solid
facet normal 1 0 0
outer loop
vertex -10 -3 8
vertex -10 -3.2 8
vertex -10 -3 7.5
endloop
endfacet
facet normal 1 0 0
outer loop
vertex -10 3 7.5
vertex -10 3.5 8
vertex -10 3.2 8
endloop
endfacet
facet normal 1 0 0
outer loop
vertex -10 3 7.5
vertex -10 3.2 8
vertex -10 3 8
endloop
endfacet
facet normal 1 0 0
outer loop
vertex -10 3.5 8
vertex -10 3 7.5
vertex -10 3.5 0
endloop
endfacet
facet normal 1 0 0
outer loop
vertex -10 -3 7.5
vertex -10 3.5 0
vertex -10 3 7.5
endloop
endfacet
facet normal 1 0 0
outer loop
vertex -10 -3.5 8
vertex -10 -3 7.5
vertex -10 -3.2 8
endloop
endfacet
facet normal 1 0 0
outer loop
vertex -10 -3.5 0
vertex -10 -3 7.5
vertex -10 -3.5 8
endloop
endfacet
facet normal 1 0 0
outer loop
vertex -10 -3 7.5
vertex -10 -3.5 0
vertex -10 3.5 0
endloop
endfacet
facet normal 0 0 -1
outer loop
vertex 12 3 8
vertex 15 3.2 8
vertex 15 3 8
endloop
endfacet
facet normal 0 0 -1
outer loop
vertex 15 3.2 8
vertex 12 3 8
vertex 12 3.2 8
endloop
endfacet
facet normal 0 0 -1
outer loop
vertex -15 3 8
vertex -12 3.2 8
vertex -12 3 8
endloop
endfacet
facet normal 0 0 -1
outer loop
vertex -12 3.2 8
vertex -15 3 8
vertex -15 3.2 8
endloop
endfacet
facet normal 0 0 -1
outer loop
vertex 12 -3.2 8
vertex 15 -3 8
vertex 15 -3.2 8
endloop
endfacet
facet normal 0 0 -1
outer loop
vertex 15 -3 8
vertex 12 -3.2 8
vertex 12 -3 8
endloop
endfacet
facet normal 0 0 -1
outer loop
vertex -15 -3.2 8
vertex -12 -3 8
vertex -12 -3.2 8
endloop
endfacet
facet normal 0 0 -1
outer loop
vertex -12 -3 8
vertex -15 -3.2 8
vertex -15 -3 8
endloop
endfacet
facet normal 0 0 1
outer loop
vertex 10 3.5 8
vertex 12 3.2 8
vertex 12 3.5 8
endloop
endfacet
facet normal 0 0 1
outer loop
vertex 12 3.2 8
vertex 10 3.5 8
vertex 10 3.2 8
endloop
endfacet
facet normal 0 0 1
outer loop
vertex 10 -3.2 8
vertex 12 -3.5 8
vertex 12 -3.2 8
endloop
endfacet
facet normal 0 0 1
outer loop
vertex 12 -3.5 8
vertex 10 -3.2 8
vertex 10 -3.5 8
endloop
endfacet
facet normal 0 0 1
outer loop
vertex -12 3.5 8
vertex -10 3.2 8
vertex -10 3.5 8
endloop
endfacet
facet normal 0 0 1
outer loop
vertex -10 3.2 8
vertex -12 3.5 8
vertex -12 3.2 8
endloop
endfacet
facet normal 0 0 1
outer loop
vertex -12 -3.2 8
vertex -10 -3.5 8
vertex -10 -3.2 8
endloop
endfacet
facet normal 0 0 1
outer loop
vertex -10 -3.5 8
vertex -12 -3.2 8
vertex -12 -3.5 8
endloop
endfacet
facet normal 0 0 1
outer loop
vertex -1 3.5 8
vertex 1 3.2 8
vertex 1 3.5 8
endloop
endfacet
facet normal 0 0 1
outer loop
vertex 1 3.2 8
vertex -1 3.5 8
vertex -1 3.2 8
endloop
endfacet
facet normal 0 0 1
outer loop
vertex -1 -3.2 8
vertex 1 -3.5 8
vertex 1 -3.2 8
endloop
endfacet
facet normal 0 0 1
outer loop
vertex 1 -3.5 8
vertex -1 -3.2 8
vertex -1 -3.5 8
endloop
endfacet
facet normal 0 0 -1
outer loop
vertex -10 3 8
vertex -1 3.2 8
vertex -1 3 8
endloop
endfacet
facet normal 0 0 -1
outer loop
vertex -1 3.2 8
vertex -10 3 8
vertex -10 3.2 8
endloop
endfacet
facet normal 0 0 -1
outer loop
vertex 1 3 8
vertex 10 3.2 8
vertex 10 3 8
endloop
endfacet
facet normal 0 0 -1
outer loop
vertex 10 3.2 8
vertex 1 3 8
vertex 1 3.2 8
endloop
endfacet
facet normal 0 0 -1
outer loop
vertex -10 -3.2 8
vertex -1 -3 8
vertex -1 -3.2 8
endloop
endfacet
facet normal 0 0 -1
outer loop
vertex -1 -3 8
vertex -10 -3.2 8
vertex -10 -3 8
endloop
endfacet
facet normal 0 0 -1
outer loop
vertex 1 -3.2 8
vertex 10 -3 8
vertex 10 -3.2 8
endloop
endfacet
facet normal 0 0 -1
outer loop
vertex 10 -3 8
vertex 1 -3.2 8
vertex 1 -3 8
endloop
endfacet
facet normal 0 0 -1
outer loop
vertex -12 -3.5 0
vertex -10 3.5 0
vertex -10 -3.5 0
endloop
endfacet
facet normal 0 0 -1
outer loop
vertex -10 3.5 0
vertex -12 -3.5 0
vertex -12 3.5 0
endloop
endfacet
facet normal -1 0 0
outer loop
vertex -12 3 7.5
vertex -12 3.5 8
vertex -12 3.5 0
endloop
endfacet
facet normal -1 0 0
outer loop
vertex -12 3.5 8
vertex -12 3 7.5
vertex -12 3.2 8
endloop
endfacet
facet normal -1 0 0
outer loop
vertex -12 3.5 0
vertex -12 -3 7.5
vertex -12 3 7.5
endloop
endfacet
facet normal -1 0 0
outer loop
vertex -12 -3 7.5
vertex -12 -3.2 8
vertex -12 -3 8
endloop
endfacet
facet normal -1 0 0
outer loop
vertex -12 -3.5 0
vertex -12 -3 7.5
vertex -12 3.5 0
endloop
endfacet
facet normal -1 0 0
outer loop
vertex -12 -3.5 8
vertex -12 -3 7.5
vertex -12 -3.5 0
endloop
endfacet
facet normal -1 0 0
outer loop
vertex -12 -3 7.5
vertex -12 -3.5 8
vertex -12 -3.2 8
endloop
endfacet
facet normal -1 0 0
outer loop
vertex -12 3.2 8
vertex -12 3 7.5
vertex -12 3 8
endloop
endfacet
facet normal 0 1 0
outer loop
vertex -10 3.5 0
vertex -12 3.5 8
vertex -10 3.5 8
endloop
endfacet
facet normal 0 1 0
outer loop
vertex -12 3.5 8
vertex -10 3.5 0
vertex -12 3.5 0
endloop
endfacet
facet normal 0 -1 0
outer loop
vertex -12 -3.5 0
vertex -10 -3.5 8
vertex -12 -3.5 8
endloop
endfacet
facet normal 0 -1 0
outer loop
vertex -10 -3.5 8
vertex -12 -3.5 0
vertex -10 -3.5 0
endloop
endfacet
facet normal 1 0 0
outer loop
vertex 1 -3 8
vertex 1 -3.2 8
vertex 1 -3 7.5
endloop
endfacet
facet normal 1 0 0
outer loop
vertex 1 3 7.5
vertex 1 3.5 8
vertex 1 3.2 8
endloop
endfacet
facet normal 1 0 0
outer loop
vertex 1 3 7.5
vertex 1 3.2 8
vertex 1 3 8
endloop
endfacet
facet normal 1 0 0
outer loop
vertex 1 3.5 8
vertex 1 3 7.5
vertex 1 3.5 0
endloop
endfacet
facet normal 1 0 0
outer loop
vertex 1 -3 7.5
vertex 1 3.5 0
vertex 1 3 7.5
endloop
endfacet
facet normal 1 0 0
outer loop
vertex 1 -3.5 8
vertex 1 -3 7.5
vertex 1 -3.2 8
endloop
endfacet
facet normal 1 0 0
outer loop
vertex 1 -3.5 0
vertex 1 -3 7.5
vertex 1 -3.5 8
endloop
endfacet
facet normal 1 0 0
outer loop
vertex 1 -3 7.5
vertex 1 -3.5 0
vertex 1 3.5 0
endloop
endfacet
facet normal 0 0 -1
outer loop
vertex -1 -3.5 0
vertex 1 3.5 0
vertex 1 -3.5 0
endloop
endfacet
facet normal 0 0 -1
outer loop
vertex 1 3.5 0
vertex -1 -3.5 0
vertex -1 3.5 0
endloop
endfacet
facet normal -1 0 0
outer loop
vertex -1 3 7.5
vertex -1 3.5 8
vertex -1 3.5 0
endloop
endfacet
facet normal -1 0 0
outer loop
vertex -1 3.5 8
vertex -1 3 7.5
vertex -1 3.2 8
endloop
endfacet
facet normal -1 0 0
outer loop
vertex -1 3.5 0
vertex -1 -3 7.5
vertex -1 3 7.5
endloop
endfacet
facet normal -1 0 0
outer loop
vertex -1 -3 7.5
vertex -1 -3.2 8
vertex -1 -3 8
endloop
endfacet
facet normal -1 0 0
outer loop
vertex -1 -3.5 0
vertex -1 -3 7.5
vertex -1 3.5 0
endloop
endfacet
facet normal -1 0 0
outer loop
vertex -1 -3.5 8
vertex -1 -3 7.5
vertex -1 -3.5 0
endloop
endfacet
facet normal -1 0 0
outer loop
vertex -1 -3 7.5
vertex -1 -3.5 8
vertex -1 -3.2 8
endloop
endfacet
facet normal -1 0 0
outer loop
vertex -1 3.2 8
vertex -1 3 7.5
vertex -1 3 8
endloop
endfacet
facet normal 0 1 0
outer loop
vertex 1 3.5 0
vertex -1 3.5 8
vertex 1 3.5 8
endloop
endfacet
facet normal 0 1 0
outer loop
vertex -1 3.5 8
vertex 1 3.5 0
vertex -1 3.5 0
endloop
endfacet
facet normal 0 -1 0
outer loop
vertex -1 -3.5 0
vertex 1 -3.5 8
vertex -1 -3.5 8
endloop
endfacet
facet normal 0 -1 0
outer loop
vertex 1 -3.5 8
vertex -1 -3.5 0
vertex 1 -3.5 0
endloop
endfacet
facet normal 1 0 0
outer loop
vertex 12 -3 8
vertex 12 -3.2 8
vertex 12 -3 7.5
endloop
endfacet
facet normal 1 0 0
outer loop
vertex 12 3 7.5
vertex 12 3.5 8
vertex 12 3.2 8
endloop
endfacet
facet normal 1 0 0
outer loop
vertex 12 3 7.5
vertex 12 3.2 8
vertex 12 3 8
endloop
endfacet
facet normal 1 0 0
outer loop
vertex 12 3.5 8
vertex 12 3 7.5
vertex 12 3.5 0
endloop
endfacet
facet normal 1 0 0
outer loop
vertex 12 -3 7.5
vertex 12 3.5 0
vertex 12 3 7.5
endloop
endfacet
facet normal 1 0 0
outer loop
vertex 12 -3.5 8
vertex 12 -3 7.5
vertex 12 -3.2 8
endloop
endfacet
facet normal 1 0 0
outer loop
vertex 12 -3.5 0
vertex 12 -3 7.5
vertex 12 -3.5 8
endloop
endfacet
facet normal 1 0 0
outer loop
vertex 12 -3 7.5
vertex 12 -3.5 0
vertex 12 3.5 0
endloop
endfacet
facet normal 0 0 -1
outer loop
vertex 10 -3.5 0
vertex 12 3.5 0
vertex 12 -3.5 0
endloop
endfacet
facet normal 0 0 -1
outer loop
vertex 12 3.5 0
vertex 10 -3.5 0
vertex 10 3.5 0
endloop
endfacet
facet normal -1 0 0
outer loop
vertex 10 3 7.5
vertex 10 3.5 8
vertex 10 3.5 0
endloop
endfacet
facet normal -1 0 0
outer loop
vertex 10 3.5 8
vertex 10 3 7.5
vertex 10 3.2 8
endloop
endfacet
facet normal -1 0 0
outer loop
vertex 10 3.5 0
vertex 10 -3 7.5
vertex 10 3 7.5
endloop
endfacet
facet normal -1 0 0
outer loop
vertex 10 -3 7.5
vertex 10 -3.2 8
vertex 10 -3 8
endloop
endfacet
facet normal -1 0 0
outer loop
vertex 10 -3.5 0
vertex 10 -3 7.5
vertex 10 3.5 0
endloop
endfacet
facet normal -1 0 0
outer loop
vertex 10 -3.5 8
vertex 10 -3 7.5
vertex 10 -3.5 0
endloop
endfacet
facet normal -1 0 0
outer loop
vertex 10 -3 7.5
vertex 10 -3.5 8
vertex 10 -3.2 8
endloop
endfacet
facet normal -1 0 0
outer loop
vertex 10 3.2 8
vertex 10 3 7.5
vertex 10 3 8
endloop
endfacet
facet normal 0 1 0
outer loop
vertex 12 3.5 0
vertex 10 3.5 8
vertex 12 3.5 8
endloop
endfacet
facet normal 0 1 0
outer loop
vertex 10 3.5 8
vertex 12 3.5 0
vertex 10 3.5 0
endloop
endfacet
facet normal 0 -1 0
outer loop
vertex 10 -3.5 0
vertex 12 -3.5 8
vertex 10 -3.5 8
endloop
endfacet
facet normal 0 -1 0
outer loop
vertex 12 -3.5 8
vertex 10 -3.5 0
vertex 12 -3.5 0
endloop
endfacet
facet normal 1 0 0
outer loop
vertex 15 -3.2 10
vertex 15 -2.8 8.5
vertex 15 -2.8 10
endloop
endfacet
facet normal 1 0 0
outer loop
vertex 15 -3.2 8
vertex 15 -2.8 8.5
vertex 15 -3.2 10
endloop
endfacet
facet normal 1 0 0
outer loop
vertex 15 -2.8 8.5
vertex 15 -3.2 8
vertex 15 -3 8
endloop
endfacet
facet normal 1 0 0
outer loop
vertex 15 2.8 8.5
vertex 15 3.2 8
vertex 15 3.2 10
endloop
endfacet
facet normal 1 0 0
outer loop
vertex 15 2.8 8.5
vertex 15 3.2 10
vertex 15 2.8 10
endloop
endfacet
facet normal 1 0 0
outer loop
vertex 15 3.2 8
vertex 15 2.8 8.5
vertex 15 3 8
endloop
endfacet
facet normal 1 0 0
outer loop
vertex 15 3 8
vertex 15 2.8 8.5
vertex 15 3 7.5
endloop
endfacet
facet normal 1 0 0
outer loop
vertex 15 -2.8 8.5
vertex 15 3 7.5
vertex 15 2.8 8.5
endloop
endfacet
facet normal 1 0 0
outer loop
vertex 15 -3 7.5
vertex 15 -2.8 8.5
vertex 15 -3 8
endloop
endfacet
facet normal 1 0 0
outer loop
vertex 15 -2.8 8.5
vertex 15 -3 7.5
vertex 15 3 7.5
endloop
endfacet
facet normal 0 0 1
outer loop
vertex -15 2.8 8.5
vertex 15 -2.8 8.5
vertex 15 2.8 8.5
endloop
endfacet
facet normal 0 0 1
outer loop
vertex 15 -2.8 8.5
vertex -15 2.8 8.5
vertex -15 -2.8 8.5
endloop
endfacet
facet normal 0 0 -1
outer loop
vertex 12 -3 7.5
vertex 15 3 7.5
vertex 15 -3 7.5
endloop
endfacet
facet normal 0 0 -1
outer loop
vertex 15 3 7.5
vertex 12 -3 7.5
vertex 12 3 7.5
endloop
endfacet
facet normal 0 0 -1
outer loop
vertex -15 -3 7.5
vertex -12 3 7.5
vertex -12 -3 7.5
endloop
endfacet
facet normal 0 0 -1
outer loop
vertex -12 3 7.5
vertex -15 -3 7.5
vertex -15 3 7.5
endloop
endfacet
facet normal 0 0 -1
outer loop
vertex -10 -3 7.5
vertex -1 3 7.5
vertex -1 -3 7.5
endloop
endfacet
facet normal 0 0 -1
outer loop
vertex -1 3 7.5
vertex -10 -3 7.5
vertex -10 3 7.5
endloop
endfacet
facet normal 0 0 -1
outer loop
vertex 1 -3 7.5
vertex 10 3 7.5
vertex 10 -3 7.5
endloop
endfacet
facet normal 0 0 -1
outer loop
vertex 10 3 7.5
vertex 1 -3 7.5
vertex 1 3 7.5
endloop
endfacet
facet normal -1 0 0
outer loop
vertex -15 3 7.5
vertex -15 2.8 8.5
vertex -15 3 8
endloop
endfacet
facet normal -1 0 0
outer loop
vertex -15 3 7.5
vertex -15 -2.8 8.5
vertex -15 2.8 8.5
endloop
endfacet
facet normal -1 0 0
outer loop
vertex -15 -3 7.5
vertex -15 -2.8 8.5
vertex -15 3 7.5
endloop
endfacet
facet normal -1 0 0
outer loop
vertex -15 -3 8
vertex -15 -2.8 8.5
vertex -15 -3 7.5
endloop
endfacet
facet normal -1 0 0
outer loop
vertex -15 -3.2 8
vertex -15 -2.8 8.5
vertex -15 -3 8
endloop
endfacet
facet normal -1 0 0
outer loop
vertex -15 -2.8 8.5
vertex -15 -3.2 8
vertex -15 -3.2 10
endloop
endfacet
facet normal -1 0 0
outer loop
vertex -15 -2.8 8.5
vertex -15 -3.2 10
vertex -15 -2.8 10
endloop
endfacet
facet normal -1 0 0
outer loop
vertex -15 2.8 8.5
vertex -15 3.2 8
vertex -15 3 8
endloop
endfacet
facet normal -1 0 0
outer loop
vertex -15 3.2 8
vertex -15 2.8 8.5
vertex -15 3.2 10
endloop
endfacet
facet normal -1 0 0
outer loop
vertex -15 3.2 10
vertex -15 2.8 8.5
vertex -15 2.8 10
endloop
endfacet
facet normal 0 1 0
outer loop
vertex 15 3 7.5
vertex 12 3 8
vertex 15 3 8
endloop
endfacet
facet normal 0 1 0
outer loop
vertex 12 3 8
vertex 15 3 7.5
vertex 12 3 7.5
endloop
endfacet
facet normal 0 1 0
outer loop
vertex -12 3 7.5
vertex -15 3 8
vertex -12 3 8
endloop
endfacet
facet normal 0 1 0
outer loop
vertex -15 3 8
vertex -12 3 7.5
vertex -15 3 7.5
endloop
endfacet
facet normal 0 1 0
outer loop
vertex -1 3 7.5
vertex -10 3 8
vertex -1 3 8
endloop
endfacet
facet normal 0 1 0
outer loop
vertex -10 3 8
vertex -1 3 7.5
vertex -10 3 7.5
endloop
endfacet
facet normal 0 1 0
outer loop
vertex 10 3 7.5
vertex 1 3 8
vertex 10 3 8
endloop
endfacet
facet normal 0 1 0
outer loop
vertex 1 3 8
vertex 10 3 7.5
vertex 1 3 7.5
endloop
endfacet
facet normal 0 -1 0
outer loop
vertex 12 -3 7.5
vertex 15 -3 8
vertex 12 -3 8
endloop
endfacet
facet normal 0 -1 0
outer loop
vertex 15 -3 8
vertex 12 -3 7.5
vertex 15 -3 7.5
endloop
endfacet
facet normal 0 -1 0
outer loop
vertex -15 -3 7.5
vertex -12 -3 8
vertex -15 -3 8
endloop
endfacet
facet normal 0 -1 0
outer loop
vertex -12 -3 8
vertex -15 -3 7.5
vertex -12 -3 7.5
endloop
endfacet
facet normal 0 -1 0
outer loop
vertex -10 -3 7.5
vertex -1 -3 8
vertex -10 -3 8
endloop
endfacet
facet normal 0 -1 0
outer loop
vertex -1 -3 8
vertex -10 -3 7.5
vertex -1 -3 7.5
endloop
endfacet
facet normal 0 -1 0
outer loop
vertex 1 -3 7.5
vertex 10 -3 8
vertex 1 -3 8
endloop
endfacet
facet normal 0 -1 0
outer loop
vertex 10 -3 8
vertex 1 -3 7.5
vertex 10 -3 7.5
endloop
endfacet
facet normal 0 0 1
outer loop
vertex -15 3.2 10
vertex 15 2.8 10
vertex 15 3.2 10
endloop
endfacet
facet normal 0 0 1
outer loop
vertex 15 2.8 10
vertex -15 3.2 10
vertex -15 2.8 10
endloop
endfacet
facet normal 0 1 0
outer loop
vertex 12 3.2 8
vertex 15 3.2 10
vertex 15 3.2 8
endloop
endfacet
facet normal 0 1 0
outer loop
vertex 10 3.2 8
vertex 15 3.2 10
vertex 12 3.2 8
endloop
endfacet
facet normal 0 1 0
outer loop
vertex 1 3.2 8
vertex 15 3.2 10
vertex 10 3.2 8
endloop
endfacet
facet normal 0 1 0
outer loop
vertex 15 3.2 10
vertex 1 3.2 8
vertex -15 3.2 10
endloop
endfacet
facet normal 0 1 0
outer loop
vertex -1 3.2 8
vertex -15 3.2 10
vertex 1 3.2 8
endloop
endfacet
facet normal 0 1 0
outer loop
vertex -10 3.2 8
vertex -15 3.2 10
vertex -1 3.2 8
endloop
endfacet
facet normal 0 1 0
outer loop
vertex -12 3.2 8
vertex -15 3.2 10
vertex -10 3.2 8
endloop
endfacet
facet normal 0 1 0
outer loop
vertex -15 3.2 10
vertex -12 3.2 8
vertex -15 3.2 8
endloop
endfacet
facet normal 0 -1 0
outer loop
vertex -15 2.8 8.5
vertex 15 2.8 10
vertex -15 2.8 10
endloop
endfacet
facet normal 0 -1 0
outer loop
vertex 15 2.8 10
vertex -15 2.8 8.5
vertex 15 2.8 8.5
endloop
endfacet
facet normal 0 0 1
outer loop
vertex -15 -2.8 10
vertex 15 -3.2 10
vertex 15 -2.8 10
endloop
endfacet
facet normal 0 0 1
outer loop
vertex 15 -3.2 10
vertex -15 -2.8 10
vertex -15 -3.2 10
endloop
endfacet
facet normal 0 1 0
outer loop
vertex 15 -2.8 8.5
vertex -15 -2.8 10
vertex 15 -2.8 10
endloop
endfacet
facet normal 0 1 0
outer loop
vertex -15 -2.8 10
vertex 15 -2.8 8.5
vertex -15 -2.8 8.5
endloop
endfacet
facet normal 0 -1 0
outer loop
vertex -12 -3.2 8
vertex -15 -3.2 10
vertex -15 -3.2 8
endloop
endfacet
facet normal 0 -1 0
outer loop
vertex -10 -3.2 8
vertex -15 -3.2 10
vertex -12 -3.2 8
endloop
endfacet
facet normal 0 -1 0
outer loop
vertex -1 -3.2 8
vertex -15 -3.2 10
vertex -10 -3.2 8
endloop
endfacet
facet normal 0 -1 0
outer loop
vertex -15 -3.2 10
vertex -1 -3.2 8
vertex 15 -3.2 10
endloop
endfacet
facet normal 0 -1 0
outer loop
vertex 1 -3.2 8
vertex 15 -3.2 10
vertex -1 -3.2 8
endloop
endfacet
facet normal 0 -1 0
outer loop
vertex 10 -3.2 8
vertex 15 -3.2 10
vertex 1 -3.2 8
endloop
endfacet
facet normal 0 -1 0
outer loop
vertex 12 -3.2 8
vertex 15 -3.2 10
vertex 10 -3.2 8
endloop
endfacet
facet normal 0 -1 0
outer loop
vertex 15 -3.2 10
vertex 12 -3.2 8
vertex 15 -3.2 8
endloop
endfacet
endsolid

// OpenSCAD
// 桥梁 (battle_bridge) — 枪战通路资产
// 桥面 + 栏杆 + 桥墩，可跨越沟壑/河道
$fn = 6;

module bridge() {
  len = 30; w = 6; h = 8;
  // 桥面
  color([0.55, 0.55, 0.58]) translate([0, 0, h]) cube([len, w, 1], center = true);
  // 栏杆
  color([0.45, 0.45, 0.48]) translate([0, w/2, h + 1]) cube([len, 0.4, 2], center = true);
  color([0.45, 0.45, 0.48]) translate([0, -w/2, h + 1]) cube([len, 0.4, 2], center = true);
  // 桥墩
  for (x = [-len/2 + 4, 0, len/2 - 4]) {
    color([0.50, 0.50, 0.52]) translate([x, 0, h/2]) cube([2, w + 1, h], center = true);
  }
}

bridge();
